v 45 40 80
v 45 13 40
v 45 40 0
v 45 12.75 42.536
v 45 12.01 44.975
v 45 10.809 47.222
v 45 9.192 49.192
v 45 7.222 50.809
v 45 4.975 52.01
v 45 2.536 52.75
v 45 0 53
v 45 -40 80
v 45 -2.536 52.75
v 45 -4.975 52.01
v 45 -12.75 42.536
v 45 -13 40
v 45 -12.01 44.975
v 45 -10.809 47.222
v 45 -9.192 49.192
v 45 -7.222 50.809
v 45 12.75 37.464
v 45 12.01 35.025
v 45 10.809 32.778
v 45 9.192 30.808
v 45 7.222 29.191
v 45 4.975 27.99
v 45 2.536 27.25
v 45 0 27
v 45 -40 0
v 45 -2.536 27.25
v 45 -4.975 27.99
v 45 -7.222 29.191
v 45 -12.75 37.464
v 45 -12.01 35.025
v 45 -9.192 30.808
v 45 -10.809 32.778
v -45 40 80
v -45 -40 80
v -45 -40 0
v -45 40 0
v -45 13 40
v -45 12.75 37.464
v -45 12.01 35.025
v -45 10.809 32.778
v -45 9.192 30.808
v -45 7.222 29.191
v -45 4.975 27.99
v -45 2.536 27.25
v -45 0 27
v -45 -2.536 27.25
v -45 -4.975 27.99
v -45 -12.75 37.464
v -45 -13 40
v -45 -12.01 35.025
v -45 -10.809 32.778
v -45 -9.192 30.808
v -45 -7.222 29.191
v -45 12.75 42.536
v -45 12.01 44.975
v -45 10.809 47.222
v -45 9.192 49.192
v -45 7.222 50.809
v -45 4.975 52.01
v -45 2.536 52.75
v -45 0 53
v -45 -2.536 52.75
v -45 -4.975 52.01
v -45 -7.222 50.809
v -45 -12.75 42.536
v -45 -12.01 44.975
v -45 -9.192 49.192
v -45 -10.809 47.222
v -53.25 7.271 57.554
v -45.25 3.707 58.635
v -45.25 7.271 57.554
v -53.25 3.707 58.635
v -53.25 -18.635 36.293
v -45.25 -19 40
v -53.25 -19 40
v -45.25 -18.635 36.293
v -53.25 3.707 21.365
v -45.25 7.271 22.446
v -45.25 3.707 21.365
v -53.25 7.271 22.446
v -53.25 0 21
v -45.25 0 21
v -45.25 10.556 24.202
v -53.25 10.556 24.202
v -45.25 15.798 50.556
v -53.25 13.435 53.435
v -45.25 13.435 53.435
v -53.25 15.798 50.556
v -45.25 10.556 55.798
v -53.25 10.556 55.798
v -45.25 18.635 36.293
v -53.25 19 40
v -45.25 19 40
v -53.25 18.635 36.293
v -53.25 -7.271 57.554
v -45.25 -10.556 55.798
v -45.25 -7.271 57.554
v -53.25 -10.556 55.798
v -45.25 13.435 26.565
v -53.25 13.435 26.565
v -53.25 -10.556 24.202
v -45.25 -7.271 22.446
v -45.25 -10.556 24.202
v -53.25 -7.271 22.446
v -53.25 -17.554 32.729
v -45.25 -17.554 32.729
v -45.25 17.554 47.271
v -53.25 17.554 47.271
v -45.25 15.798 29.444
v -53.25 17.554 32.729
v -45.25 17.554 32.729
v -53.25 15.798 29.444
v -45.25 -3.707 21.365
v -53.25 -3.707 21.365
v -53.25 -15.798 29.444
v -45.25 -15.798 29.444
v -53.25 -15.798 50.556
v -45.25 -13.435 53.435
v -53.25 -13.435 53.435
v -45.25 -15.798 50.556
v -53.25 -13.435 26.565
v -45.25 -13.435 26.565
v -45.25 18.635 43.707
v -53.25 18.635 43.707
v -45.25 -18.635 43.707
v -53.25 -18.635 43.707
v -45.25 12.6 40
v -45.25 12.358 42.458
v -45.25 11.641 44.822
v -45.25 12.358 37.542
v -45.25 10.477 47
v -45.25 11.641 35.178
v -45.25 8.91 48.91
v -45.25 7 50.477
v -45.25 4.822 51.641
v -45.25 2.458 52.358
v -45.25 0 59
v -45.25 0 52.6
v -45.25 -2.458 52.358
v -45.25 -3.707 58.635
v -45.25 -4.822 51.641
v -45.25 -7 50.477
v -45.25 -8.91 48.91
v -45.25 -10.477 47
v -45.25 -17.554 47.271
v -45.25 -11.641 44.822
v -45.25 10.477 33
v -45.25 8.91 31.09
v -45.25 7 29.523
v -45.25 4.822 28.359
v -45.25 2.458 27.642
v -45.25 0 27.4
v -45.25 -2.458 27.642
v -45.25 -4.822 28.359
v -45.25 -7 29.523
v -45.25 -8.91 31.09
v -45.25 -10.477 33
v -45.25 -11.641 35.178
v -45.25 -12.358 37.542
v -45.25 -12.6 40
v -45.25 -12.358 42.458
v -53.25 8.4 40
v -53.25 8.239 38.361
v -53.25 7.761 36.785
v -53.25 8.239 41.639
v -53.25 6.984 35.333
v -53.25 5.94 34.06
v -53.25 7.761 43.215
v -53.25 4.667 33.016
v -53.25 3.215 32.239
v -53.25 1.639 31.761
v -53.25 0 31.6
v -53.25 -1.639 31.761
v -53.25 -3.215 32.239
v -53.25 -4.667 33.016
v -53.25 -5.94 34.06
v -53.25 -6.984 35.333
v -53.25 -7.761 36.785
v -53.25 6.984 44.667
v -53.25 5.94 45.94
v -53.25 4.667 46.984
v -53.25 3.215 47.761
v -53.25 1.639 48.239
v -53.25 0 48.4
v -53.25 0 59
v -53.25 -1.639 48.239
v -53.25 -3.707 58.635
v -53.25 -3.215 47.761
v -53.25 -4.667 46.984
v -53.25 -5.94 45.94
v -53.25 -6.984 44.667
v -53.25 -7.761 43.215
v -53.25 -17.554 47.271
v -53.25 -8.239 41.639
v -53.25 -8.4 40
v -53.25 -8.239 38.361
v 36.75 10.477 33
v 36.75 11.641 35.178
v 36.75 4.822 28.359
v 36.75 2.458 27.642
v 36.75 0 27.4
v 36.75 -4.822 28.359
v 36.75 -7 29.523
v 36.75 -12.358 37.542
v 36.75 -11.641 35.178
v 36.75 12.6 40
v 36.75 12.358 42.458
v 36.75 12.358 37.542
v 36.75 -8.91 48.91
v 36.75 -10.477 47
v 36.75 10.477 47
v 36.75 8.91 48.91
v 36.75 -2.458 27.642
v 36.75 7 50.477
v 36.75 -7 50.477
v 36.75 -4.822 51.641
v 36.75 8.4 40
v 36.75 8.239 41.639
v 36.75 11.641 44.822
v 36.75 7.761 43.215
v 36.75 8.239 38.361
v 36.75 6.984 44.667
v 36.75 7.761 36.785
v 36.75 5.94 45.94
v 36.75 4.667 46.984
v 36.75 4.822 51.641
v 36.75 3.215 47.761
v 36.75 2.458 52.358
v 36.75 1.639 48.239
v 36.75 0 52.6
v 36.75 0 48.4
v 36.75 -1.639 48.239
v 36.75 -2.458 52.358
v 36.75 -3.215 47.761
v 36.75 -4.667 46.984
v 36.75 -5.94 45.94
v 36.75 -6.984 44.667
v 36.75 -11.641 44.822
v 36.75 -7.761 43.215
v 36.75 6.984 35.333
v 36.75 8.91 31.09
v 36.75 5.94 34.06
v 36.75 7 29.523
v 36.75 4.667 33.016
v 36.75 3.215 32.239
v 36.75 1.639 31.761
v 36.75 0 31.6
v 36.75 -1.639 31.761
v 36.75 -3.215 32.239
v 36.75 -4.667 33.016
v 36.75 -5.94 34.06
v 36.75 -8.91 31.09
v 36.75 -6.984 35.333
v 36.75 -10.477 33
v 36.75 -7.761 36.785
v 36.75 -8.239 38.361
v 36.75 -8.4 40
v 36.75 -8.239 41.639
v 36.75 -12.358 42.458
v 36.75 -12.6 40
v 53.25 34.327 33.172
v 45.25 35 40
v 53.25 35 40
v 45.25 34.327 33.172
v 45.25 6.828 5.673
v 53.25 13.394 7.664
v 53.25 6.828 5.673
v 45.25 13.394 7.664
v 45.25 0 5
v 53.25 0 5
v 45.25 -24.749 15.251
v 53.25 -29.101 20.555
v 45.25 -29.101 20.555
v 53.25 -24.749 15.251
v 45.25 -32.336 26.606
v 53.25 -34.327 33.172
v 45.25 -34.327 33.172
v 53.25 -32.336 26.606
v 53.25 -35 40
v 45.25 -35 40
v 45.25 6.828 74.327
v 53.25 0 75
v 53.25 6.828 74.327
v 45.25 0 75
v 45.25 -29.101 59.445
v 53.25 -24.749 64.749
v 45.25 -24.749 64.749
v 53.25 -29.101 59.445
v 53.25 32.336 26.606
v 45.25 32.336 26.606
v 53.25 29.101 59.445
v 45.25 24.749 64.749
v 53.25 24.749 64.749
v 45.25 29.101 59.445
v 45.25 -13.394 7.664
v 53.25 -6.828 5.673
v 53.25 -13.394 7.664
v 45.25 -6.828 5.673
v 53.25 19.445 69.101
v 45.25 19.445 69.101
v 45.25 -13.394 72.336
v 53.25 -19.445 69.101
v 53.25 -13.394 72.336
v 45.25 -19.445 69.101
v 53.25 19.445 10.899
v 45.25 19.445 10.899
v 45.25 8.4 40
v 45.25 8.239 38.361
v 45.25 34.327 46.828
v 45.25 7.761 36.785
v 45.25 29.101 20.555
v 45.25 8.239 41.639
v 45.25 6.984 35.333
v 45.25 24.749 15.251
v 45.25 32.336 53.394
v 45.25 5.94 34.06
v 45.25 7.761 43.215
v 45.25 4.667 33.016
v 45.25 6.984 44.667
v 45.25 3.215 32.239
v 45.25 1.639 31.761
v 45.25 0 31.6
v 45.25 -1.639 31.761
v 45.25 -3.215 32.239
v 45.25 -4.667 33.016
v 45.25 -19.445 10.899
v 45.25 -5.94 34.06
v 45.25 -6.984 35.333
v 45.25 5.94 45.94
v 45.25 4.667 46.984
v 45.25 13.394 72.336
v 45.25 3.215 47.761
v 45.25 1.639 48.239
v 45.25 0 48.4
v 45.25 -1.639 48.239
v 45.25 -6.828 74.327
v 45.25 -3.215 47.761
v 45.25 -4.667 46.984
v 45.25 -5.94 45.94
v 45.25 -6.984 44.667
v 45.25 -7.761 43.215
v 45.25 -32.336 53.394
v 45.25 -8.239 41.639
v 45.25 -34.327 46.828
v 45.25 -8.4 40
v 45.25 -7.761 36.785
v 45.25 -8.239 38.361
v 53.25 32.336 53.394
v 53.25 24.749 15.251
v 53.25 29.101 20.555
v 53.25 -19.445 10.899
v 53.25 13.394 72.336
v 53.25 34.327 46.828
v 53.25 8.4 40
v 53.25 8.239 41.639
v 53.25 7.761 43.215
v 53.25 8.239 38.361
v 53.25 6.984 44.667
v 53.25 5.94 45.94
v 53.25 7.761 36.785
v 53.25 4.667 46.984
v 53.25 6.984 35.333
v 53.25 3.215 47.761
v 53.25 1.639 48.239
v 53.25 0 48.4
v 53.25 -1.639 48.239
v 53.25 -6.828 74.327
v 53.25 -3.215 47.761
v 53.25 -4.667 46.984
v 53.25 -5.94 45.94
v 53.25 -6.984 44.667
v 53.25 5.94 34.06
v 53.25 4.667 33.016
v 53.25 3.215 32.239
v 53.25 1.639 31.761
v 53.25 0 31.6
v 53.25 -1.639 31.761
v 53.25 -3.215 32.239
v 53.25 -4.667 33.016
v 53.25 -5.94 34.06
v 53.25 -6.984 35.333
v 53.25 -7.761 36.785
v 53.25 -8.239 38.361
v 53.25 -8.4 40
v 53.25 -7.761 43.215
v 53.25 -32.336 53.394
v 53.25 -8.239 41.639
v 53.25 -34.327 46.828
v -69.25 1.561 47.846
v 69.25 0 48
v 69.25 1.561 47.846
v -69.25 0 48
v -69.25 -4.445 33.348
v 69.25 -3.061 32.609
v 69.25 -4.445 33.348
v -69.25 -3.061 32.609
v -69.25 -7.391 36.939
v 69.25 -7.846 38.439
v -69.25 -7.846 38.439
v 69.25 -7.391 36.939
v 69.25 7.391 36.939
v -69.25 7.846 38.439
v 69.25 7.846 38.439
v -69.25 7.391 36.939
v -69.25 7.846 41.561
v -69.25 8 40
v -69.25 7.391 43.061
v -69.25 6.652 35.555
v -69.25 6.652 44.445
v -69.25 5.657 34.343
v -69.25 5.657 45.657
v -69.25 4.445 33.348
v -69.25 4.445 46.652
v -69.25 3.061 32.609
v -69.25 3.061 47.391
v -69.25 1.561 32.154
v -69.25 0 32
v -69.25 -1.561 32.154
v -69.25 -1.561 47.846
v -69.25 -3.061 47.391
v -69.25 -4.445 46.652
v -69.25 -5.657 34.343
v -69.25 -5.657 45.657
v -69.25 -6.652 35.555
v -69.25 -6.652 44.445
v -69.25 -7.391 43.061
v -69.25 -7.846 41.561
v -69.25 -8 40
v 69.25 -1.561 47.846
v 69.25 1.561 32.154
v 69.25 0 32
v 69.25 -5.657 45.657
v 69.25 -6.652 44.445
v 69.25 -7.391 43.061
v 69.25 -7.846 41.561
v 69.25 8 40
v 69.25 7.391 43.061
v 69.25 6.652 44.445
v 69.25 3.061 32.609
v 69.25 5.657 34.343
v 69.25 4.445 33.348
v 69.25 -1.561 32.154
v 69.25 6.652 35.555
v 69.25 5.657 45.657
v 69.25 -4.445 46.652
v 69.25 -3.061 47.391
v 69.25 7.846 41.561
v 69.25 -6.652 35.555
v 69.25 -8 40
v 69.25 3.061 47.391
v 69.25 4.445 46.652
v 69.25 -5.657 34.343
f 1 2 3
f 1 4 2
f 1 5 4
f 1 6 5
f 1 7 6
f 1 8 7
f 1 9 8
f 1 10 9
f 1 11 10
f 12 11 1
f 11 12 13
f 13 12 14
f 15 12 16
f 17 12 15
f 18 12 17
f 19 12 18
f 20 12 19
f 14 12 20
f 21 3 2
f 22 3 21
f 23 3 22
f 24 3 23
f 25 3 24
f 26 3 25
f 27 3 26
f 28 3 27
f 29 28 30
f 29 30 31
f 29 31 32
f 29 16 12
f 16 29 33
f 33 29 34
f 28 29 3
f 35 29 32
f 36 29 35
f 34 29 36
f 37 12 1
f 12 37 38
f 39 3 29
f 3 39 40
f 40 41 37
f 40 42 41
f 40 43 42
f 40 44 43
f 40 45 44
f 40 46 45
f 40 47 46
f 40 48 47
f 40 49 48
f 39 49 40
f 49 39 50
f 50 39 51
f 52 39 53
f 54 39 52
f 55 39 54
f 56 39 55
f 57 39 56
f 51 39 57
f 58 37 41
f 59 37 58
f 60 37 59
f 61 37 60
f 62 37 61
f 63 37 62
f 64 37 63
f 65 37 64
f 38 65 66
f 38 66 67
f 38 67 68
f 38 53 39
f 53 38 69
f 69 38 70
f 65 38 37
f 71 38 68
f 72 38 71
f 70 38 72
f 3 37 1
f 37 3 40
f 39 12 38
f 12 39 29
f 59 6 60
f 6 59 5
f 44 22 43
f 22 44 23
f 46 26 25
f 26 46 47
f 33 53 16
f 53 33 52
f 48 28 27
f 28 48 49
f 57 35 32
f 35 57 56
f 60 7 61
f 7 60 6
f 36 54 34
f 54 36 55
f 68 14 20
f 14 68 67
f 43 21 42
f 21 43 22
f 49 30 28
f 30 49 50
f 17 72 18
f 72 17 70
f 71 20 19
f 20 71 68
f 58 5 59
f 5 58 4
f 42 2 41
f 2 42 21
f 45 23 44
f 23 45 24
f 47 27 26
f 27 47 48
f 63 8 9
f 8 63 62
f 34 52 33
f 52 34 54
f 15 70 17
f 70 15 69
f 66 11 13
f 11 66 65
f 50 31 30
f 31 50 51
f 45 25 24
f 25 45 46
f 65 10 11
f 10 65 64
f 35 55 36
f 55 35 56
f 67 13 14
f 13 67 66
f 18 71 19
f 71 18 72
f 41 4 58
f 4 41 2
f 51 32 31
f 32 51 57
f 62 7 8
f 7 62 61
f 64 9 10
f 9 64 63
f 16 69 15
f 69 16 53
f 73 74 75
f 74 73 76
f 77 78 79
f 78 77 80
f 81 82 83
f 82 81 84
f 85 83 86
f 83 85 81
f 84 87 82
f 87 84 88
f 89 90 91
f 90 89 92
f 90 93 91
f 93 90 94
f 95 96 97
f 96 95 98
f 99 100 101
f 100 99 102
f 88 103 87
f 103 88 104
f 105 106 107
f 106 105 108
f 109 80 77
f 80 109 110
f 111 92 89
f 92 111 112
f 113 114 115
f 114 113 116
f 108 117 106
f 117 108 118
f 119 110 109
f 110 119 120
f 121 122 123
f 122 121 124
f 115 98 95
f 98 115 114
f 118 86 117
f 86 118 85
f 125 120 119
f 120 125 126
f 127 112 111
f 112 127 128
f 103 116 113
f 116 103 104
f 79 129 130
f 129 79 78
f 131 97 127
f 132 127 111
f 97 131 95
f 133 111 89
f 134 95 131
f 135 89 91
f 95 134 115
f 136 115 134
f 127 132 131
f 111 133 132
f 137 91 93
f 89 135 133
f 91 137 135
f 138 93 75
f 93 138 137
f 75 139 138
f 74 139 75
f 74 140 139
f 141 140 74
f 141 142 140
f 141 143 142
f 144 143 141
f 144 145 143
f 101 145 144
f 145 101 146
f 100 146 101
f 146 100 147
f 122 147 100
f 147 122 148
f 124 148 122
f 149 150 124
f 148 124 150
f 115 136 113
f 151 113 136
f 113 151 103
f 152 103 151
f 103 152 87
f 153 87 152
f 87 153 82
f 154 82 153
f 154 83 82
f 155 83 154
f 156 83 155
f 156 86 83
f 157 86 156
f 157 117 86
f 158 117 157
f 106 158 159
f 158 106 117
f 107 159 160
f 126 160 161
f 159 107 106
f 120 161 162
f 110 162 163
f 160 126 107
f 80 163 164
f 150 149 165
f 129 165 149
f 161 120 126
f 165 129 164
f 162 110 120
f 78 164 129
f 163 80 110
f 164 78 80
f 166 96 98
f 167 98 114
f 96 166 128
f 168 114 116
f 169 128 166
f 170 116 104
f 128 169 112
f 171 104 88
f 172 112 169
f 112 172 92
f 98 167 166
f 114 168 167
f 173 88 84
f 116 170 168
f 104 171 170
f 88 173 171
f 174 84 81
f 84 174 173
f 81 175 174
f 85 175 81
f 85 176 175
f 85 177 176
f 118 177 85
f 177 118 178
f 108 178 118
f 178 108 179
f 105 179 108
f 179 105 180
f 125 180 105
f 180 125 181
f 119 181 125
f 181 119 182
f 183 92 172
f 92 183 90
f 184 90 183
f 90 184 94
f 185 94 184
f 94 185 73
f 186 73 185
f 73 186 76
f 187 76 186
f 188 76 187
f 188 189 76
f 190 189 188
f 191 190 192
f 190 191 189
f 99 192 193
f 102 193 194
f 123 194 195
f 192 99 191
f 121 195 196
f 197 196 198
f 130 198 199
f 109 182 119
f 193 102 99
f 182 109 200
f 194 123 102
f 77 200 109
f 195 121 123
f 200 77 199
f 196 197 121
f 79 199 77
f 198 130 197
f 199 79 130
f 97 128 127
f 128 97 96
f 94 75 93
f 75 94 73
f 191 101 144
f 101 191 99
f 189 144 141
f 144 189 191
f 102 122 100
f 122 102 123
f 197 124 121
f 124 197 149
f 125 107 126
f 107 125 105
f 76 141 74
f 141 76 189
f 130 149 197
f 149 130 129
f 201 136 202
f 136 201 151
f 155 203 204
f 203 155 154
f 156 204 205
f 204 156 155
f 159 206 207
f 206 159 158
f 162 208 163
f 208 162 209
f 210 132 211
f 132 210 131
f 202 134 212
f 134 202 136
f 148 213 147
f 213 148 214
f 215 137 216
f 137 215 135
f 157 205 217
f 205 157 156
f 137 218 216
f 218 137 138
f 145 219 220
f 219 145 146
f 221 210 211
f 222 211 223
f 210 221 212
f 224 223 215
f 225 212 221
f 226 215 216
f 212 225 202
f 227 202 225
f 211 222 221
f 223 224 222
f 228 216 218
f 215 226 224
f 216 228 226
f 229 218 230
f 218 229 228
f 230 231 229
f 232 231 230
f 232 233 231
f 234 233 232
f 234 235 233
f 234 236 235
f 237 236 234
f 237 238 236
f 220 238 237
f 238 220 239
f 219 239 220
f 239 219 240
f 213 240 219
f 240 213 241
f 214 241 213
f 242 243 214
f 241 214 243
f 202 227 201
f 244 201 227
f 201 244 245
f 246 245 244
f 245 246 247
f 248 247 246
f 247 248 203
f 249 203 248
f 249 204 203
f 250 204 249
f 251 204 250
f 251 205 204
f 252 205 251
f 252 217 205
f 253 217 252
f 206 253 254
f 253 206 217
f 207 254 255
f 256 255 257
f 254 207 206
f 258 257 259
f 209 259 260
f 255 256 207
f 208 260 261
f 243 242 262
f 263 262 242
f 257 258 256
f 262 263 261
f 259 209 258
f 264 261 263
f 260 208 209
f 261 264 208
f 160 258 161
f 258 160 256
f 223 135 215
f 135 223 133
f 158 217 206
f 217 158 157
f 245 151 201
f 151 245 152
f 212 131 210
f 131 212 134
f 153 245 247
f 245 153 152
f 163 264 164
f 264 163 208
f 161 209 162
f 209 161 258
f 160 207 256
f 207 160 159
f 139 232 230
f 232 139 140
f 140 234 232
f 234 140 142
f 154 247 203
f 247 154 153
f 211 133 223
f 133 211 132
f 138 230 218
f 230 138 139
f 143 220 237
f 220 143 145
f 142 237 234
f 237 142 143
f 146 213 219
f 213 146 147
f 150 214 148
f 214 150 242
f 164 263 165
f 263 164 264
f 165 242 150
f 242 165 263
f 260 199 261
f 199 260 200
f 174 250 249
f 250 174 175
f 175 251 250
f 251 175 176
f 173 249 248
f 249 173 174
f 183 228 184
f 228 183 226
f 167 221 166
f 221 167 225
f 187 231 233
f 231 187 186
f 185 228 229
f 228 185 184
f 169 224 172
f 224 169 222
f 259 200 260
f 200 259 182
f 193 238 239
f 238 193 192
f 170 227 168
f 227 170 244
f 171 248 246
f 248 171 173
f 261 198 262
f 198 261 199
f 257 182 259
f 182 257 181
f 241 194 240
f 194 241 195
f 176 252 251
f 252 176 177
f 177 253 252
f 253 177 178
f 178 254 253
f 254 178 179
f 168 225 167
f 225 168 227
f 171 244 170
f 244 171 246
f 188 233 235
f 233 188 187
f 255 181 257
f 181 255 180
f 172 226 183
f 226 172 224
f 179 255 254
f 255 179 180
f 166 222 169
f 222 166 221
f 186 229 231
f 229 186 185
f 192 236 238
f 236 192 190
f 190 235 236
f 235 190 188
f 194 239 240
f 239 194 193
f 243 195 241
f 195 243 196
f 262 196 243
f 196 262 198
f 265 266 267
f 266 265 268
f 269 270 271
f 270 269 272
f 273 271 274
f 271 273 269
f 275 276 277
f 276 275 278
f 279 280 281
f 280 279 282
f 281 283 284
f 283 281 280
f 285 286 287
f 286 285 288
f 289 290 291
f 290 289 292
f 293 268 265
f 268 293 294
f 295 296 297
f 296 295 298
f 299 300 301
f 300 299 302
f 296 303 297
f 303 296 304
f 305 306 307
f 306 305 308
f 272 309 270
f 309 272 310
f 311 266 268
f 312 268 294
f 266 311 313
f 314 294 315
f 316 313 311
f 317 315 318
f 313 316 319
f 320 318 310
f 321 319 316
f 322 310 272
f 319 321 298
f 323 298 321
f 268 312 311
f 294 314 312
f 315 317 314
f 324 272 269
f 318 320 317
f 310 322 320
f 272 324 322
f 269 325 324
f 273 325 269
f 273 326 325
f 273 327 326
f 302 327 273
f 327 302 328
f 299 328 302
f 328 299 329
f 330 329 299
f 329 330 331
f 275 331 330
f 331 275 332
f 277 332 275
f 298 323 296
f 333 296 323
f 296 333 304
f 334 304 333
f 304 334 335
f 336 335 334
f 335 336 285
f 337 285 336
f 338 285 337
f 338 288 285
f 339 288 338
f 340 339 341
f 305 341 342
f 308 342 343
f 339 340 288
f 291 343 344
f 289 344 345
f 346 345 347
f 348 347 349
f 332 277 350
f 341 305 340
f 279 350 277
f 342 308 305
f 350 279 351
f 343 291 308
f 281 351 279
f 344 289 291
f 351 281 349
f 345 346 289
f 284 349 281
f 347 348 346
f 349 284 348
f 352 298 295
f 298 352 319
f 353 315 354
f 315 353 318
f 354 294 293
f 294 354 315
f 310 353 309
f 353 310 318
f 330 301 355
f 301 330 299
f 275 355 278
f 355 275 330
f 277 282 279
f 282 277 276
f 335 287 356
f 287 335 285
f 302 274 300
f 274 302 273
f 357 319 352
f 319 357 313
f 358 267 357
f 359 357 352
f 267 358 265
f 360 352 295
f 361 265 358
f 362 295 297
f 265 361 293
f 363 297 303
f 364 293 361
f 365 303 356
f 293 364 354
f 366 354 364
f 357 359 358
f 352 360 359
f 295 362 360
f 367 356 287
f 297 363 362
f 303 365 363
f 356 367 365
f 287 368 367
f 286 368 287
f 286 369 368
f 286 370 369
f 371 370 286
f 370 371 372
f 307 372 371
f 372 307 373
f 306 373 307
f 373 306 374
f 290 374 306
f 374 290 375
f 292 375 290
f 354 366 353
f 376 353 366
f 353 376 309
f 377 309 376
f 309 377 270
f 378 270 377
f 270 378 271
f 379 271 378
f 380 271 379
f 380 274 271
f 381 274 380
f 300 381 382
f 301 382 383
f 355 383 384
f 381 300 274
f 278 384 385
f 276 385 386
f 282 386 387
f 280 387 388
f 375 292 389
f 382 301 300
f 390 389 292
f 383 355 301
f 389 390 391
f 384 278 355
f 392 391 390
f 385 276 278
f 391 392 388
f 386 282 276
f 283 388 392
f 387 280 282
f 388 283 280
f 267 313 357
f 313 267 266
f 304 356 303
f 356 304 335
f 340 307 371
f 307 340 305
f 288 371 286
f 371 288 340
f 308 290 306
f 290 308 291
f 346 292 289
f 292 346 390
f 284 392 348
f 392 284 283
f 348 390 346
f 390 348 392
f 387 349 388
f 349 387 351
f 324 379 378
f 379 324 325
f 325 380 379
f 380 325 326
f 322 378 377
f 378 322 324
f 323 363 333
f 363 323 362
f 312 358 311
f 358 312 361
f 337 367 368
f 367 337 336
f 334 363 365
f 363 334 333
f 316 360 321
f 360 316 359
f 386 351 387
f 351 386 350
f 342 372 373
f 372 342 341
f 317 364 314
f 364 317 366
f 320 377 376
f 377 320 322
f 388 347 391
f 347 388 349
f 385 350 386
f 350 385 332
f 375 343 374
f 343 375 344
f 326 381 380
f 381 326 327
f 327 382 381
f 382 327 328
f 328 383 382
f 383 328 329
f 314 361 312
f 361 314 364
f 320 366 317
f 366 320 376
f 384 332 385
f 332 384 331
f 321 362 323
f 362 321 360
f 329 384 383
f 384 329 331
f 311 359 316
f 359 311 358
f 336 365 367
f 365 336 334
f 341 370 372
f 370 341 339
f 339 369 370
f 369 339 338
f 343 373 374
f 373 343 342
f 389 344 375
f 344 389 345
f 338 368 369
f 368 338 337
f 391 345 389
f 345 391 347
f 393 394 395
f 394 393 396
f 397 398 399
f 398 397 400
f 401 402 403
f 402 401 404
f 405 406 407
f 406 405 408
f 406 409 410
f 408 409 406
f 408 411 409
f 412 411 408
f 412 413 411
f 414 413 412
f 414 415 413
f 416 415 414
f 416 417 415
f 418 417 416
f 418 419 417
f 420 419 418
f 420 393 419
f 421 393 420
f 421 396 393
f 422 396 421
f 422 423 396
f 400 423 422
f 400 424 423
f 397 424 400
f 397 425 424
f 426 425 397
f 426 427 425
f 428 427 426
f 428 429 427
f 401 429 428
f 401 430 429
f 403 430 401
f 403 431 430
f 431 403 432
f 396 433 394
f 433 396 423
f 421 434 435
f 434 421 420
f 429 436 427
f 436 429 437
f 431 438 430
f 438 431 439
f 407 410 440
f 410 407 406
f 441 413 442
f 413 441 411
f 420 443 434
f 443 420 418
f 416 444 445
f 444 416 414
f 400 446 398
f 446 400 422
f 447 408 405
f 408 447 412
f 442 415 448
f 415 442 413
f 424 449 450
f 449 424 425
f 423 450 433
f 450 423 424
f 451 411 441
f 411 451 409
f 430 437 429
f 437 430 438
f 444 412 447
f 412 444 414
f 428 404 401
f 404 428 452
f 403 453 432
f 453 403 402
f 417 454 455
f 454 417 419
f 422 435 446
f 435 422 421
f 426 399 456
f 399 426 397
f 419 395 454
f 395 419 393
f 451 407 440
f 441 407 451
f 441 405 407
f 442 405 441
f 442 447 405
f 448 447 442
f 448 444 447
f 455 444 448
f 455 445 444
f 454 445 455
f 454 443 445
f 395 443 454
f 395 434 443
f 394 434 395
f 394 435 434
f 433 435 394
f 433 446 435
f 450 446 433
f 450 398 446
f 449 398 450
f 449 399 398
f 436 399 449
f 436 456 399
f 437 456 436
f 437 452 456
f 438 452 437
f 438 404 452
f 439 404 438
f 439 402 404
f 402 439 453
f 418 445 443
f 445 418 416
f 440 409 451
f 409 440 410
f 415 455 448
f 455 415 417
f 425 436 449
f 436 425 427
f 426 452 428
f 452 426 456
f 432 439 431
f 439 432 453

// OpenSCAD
$fn = 32;

// ------------------------------------------------------------------------
// Bushed housing: 90 x 80 x 80 mm housing, bushing d25.2
// Every part is its own module, assembly() places them once.
// ------------------------------------------------------------------------

// --- part 1 ---
module housing() {
  difference() {
    translate([-45, -40, 0]) cube([90, 80, 80]);
    translate([0, 0, 40]) rotate([0, 90, 0]) cylinder(h = 92, d = 26, center = true);
  }
}

// --- part 2 ---
module bushing() {
  difference() {
    union() {
      cylinder(h = 8, d = 38);
      translate([0, 0, 8]) cylinder(h = 82, d = 25.2);
    }
    translate([0, 0, -1]) cylinder(h = 92, d = 16.8);
  }
}

// --- part 3 ---
module shaft() {
  translate([0, 0, -69.25]) cylinder(h = 138.5, d = 16);
}

// --- part 4 ---
module cover() {
  difference() {
    cylinder(h = 8, d = 70);
    translate([0, 0, -1]) cylinder(h = 10, d = 16.8);
  }
}

// --- assembly ---
module assembly() {
  translate([0, 0, 0]) rotate([0, 0, 0]) housing();
  translate([-53.25, 0, 40]) rotate([0, 90, 0]) bushing();
  translate([0, 0, 40]) rotate([0, 90, 0]) shaft();
  translate([45.25, 0, 40]) rotate([0, 90, 0]) cover();
}

assembly();
